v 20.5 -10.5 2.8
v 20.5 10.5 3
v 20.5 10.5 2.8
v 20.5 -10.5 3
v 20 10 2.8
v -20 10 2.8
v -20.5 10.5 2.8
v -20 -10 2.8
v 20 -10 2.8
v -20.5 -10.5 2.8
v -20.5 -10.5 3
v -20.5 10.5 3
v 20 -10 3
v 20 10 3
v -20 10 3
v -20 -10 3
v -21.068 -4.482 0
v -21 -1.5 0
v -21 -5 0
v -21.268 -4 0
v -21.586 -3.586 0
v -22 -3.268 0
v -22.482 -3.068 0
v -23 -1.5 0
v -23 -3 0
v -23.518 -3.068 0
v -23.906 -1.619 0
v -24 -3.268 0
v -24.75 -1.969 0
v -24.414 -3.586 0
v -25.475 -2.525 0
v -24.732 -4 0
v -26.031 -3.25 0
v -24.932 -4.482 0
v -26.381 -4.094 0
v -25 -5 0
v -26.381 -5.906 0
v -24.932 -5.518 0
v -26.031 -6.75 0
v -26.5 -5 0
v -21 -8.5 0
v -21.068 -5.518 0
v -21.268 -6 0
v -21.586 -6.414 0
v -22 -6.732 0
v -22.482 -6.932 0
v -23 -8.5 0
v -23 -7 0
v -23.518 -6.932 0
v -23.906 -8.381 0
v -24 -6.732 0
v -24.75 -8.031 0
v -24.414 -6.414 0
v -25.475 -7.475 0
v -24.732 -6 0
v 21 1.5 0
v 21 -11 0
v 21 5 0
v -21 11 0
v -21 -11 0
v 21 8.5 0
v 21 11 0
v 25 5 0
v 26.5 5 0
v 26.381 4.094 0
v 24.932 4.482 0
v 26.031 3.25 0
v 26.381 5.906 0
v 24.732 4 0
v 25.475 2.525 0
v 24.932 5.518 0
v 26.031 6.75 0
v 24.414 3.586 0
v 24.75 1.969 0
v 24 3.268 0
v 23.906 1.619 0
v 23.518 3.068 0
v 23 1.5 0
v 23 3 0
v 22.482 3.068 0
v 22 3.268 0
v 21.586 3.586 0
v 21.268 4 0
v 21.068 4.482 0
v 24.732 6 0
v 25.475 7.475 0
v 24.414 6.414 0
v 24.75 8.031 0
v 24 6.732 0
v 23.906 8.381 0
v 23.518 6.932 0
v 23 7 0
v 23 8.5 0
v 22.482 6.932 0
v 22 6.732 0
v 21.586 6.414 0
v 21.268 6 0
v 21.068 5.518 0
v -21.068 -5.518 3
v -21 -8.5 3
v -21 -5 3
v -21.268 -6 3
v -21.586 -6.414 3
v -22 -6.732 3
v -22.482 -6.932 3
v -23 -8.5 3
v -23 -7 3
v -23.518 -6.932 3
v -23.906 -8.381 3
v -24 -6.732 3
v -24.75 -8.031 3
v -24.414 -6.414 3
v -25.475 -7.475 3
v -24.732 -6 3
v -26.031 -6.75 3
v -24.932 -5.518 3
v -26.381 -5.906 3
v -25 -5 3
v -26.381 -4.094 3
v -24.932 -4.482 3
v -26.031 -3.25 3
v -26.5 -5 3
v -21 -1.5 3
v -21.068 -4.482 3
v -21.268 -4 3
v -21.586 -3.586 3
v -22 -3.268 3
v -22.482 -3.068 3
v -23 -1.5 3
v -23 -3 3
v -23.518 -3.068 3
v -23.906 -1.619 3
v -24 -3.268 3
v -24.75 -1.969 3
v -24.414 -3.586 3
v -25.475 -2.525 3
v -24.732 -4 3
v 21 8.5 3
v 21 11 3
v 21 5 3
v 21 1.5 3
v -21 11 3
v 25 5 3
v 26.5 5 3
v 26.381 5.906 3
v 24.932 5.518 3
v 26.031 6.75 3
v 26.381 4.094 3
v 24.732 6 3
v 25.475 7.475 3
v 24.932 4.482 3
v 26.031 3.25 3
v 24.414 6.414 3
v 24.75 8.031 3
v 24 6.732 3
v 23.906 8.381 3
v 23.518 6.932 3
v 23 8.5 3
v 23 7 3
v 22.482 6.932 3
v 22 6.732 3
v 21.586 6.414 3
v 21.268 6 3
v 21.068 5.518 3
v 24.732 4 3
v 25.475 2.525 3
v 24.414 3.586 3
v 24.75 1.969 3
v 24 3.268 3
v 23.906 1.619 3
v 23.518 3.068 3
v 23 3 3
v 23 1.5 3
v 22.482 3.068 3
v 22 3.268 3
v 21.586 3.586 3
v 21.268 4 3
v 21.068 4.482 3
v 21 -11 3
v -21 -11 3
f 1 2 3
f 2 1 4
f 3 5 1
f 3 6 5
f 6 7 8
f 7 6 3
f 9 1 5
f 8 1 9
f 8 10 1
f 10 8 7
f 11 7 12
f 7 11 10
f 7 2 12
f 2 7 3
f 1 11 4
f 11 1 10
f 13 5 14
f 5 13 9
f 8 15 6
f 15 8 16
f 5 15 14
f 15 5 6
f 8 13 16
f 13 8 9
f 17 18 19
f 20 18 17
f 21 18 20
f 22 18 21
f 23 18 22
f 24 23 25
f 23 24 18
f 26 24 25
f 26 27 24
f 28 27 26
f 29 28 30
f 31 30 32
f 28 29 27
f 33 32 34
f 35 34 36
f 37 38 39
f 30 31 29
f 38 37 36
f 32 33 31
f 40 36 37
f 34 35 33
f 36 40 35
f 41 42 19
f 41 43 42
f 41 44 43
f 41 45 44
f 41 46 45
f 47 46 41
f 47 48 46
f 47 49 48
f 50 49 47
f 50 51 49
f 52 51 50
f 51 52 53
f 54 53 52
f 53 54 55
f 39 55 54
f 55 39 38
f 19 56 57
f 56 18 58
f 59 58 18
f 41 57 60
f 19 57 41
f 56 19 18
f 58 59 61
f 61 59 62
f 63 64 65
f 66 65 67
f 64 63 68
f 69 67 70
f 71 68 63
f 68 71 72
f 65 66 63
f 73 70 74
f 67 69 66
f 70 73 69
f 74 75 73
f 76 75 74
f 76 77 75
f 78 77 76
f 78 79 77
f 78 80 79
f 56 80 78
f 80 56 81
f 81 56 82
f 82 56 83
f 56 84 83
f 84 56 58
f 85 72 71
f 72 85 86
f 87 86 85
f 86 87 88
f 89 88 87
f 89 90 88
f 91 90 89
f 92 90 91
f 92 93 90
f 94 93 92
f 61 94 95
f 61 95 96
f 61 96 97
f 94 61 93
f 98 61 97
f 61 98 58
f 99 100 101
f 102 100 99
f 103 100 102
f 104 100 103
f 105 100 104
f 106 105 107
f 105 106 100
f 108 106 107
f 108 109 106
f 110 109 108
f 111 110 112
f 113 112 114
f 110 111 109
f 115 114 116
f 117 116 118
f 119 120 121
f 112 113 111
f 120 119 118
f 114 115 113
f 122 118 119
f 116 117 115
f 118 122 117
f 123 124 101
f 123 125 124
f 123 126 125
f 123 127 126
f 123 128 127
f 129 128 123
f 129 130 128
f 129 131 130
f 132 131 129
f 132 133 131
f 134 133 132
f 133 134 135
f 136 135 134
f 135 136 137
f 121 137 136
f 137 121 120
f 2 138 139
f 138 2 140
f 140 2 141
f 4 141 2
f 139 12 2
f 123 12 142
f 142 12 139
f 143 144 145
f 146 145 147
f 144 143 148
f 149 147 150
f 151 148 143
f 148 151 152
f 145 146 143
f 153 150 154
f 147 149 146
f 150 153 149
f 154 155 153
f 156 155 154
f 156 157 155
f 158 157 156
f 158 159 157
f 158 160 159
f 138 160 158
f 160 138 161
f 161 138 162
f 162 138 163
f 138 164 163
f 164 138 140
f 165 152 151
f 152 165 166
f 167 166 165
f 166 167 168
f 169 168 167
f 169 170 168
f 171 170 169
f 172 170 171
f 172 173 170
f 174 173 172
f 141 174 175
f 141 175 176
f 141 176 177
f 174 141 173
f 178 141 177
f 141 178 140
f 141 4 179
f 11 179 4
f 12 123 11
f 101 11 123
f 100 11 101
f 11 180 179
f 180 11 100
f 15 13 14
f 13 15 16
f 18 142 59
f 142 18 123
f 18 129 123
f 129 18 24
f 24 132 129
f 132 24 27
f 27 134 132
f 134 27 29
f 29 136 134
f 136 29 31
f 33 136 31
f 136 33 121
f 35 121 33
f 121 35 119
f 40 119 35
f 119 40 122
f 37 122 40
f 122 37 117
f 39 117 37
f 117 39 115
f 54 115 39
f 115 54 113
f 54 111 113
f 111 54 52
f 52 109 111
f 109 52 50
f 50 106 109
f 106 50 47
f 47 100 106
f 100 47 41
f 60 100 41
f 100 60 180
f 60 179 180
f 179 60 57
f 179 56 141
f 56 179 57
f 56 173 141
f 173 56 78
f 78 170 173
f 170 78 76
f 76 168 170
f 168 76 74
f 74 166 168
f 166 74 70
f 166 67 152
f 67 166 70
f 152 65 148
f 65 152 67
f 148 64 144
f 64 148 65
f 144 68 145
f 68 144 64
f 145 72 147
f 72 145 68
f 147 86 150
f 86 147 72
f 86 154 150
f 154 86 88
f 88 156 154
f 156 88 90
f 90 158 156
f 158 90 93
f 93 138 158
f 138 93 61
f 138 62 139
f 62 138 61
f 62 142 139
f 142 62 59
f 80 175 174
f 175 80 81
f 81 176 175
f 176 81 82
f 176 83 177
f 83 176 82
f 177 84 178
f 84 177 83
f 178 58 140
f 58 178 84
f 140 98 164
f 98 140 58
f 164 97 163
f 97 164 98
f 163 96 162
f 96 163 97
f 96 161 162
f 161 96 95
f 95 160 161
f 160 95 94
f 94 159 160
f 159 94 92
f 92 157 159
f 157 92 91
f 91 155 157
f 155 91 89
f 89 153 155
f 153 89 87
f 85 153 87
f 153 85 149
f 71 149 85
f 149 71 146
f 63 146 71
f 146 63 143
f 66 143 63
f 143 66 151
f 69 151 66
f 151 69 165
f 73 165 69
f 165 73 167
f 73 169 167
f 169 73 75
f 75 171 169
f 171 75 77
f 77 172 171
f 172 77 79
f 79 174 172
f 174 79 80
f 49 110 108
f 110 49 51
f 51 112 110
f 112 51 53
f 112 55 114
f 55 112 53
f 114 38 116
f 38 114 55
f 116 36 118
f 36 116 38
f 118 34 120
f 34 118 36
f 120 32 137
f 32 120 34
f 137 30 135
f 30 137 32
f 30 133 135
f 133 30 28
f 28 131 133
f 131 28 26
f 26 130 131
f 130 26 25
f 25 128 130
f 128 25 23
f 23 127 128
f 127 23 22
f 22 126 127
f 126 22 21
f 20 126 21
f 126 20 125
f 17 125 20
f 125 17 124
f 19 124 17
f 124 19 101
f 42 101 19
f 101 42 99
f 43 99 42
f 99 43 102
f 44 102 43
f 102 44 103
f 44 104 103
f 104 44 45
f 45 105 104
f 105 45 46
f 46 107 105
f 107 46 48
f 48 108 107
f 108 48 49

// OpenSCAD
// file: ../keystone/keystone.scad
module keystoneCutout() {
    linear_extrude(15.2) polygon([
        [0,2],
        [1.4,2],
        [1.4,0],    
        [7.6,0],
        [9.5,2],
        [9.5,18.8],
        [4.6,24.6],
        [1.4,24.6],
        [1.4,22.6],
        [0,22.6],
    ]);
}

module keystonePort(border=4.1) {
    translate([4,4,0]) difference() {
        linear_extrude(9.5)
            offset(delta=border, chamfer=true)
                square([15.2,24.6]);
        
        translate([15.2,0,0])
            rotate([0,-90,0])
                keystoneCutout();
    }
}
// file: rearPanelCoverKeystone.scad
include <rearPanelCoverBlank.scad>;
include <../keystone/keystone.scad>

module rearPanelCoverKeystone(basePlate=[42,22,3], tab=[4,7,2.5]) {
    BasePlateY = basePlate[1];
    difference() {
        union() {
            rearPanelCoverBlank(basePlate,tab);
            translate([-2,0,0])
            linear_extrude(9.5)
                square([30,BasePlateY], center=true);
        }

        translate([24.6/2-2,-14.8/2,9.5])
            rotate([0,90,90])
                keystoneCutout();
    }
}
// file: rearPanelCoverBlank.scad
module rearPanelCoverTab(tab=[4,7]) {
    tabID=tab[0];
    tabOD=tab[1];
    difference() {
        union() {
            difference() {
                circle(d=tabOD, $fn=24);
                translate([tabOD/4,0])
                    square([tabOD/2,tabOD], center=true);
            }
            translate([tabID/4,0])
                square([tabID/2,tabOD], center=true);
        }
        circle(d=tabID, $fn=24);
    }
}

module rearPanelCoverBlankOutline(basePlate=[42,22], tab=[4,7,2.5]) {
    
    BasePlateX=basePlate[0];
    BasePlateY=basePlate[1];
    tabID=tab[0];
    tabOD=tab[1];
    tabYInset=tab[2];
    
    union() {
        square([BasePlateX, BasePlateY], center=true);
        
        translate([BasePlateX/2*-1-tabID/2,BasePlateY/2*-1+tabOD/2+tabYInset])
            rearPanelCoverTab(tab);
        
        translate([BasePlateX/2+tabID/2,BasePlateY/2-tabOD/2-tabYInset])
            rotate([0,0,180])
                rearPanelCoverTab(tab);
    }
}

module rearPanelCoverBlank(basePlate=[42,22,3], tab=[4,7,2.5]) {
    
    BasePlateX=basePlate[0];
    BasePlateY=basePlate[1];
    BasePlateZ=basePlate[2];
    tabID=tab[0];
    tabOD=tab[1];
    tabYInset=tab[2];
    
    difference() {
        linear_extrude(BasePlateZ)
            rearPanelCoverBlankOutline(basePlate, tab);
        
        // Neat little one layer border to help with orientation.
        translate([0,0,BasePlateZ])
            difference() {
                cube([BasePlateX-1, BasePlateY-1,0.4], center=true);
                cube([BasePlateX-2, BasePlateY-2,0.4], center=true);
            }
    }
}
// main file
include <rearPanelCoverBlank.scad>;
include <rearPanelCoverKeystone.scad>;

Select = 0; // [0:rearPanelCoverBlank, 1:rearPanelCoverKeystone]

if (Select==0) {
    rearPanelCoverBlank();
} else if (Select==1) {
    rearPanelCoverKeystone();
}
